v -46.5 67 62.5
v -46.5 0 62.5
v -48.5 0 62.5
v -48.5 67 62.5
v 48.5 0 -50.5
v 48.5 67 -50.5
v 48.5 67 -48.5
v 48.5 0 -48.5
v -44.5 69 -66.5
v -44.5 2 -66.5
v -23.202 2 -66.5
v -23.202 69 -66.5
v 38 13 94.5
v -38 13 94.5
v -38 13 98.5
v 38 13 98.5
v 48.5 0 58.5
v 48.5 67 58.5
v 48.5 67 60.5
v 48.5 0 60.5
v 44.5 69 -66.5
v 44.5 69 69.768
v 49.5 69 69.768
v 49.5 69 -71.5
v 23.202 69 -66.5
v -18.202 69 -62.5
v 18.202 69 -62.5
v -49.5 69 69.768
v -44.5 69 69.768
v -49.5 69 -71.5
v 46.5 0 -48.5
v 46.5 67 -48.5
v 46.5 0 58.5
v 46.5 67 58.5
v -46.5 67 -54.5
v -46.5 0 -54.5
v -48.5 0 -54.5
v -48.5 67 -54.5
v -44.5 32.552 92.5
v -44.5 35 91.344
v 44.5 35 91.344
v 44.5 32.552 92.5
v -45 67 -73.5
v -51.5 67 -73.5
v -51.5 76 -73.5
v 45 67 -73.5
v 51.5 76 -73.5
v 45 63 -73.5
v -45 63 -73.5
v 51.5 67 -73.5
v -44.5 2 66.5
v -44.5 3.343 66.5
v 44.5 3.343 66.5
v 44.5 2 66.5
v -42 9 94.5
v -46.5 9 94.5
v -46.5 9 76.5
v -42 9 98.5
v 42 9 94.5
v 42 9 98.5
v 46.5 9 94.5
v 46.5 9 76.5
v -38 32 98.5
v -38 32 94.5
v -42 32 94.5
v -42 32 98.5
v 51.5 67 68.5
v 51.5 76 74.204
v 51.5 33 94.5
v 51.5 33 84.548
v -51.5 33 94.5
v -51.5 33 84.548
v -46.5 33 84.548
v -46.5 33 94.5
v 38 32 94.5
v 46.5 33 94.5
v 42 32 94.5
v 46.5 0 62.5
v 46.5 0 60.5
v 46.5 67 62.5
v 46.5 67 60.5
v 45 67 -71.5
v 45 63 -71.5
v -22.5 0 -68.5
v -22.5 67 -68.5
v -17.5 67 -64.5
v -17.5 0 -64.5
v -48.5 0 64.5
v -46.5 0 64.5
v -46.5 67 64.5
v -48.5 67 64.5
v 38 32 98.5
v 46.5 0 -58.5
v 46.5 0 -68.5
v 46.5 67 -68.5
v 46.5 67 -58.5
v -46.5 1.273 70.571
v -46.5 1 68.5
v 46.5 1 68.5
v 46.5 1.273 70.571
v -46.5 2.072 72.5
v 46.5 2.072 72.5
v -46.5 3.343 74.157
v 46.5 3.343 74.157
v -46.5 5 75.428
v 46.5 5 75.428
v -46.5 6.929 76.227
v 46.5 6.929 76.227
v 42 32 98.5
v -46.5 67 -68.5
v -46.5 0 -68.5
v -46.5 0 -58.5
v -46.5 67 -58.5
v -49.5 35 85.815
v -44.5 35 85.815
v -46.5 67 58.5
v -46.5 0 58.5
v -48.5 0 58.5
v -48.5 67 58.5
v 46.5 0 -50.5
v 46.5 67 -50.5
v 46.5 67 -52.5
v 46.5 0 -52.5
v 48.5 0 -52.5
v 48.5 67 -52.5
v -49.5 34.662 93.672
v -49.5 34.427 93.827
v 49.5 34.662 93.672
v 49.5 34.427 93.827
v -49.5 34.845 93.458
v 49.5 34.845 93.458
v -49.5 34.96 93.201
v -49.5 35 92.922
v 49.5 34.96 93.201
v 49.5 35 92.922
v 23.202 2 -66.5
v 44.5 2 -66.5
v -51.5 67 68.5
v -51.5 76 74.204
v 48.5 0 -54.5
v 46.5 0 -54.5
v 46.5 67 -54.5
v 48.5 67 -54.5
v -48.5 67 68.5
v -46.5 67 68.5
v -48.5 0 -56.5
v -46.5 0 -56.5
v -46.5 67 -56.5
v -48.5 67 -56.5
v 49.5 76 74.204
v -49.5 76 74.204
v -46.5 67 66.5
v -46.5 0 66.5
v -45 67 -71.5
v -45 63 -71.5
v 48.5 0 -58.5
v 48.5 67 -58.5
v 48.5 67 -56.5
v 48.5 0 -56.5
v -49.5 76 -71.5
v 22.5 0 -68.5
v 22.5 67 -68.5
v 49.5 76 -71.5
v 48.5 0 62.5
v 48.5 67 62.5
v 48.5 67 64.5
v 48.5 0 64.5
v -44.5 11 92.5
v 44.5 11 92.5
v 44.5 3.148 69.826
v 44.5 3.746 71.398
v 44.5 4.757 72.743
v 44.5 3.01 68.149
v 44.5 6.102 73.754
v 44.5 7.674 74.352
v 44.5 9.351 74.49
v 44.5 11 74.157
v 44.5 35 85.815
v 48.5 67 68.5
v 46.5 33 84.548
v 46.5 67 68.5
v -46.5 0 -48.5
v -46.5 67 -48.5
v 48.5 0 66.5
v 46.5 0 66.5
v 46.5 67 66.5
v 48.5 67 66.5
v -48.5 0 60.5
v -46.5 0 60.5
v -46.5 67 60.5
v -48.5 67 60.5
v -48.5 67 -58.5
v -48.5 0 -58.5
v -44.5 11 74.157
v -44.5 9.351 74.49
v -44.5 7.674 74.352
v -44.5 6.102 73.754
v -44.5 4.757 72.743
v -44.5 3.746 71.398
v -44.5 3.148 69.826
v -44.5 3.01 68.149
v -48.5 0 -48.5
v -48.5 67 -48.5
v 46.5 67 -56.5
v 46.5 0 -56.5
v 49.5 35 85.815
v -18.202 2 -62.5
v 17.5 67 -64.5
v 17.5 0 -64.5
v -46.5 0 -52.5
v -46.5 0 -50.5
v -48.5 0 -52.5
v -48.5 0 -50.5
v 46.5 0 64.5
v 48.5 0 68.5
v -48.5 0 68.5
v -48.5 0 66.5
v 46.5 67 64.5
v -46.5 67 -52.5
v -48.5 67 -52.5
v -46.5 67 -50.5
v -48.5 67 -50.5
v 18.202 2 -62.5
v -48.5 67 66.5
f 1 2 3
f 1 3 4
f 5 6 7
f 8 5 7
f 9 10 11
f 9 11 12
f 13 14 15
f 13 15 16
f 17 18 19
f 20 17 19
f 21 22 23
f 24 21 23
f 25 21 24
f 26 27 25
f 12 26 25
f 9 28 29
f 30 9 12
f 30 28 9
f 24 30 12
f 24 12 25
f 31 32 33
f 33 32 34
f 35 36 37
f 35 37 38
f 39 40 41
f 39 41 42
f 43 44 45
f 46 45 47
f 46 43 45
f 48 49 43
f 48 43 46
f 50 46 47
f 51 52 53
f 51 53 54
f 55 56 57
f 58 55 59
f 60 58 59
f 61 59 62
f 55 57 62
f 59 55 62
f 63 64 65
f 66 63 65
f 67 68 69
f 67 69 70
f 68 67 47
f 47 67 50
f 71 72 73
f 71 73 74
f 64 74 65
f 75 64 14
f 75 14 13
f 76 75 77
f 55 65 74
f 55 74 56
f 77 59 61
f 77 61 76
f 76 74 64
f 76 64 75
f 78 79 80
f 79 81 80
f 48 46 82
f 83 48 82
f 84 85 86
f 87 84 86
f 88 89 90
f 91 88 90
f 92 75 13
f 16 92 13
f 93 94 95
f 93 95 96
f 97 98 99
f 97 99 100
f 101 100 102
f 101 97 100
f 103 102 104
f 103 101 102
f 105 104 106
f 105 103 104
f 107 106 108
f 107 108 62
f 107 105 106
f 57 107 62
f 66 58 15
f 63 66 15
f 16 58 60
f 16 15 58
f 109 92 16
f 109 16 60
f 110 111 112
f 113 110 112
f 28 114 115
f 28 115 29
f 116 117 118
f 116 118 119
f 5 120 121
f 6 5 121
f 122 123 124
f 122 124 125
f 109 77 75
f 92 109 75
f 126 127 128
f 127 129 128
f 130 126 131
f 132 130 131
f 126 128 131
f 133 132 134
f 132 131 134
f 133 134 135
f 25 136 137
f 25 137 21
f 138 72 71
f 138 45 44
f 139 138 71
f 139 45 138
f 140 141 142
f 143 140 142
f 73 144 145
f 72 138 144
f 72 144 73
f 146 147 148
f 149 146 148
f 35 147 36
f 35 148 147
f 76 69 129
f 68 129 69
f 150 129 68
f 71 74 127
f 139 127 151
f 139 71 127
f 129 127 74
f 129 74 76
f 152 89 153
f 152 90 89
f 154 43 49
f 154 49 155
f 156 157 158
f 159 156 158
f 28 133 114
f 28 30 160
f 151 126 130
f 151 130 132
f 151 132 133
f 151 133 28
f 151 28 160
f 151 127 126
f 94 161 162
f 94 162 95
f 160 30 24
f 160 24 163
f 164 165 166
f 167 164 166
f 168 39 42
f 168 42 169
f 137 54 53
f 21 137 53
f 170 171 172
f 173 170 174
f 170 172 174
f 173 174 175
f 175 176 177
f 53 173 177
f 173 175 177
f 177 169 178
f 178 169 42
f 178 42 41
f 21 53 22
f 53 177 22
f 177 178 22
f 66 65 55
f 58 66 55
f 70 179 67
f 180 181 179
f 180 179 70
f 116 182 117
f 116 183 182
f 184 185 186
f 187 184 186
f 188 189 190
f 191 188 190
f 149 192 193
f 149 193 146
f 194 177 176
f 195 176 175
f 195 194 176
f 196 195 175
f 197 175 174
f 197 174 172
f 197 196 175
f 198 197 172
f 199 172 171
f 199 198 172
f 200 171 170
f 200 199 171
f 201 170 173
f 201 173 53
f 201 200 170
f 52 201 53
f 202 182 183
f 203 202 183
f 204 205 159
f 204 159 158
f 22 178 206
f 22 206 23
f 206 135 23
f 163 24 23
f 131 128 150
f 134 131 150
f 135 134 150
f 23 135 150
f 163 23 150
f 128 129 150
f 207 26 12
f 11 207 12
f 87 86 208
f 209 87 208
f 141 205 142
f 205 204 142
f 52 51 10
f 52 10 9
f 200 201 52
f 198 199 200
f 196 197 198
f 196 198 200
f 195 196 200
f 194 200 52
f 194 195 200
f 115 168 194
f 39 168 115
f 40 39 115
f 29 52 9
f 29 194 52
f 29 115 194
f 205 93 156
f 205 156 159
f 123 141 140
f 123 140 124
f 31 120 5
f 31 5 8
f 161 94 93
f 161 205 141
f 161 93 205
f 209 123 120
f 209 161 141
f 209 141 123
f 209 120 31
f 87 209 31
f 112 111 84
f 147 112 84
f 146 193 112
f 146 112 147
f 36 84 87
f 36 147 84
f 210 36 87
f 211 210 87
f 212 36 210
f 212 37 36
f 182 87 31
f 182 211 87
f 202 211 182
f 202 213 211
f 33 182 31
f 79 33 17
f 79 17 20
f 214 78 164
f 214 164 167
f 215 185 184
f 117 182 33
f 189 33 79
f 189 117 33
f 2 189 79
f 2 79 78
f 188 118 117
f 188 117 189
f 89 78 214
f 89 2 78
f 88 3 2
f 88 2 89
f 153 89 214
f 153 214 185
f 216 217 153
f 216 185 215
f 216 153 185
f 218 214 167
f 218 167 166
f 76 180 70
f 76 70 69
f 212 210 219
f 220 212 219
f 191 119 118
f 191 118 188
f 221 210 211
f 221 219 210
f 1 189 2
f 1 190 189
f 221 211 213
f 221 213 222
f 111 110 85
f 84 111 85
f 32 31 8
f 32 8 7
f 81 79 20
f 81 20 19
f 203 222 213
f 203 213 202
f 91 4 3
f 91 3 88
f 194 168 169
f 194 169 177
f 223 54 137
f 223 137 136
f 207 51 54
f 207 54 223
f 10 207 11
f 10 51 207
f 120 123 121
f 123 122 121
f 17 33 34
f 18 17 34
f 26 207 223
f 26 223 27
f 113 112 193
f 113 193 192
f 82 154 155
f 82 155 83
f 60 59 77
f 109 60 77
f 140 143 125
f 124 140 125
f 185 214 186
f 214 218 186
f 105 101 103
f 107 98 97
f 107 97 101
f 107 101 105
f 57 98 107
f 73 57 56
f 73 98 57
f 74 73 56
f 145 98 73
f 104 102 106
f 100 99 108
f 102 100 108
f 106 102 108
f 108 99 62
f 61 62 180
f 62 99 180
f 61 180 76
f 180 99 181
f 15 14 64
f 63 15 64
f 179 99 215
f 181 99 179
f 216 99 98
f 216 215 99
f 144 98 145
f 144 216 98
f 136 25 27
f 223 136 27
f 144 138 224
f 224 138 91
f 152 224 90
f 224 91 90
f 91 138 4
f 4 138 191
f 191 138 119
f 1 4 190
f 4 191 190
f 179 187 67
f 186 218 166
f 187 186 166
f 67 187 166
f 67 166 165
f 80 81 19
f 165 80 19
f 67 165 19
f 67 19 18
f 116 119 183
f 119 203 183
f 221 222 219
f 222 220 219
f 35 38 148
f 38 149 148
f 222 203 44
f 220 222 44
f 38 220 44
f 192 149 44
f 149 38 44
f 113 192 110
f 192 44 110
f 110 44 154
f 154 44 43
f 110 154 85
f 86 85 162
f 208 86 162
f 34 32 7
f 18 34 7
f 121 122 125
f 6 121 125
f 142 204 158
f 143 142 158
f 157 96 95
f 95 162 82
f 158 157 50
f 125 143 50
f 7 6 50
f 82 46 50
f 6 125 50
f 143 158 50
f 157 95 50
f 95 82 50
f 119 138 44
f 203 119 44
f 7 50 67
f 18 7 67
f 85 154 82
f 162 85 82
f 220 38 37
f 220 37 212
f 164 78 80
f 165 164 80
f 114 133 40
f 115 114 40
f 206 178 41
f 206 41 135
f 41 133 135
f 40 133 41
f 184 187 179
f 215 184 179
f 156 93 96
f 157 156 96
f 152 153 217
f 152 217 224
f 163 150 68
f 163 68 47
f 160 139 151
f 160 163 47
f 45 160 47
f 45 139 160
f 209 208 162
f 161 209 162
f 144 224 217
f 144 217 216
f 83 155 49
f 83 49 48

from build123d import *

# Parameters (mm, degrees)
BOSS_EXTRUDE1_DEPTH = 67
SKETCH2_W           = 103
SKETCH2_H           = 142
BOSS_EXTRUDE2_DEPTH = 9
SKETCH3_W           = 90
SKETCH3_H           = 2
BOSS_EXTRUDE3_DEPTH = 4
SKETCH4_W           = 93
SKETCH4_H           = 24
BOSS_EXTRUDE4_DEPTH = 26
BOSS_EXTRUDE5_DEPTH = 93
BOSS_EXTRUDE6_REACH = 161.108
BOSS_EXTRUDE7_DEPTH = 93
SHELL5_START        = -44.5
SHELL5_DEPTH        = 89
SHELL5_START_2      = -49.5
SHELL5_2_DEPTH      = 99
SHELL5_3_OUTLINE_W  = 67
SHELL5_3_OUTLINE_H  = 4
SHELL5_3_DEPTH      = 21.298437881
SHELL5_START_3      = 23.201562119
SHELL5_4_OUTLINE_W  = 67
SHELL5_4_OUTLINE_H  = 4
SHELL5_4_DEPTH      = 21.298437881
SHELL5_START_4      = 2
SHELL5_5_DEPTH      = 67
CUT_EXTRUDE1_REACH  = 193.448
SKETCH11_W          = 99
SKETCH11_H          = 41
FILLET2_R           = 1
SKETCH12_W          = 2
SKETCH12_H          = 67
BOSS_EXTRUDE8_DEPTH = 2
SKETCH13_W          = 76
SKETCH13_H          = 4
BOSS_EXTRUDE9_DEPTH = 4


with BuildPart() as part:
    # Sketch1 → Boss-Extrude1 (new body)
    with BuildSketch(Plane(origin=(0, 0, 0), x_dir=(1, 0, 0), z_dir=(0, 1, 0))):
        Polygon((-17.5, 64.5), (17.5, 64.5), (22.5, 68.5), (46.5, 68.5), (46.5, -68.5), (-46.5, -68.5), (-46.5, 68.5), (-22.5, 68.5), align=None)
    extrude(amount=BOSS_EXTRUDE1_DEPTH)

    # Sketch2 → Boss-Extrude2 (add)
    with BuildSketch(Plane(origin=(0, 67, 0), x_dir=(1, 0, 0), z_dir=(0, 1, 0))):
        with Locations((0, 2.5)):
            Rectangle(SKETCH2_W, SKETCH2_H)
    extrude(amount=BOSS_EXTRUDE2_DEPTH)

    # Sketch3 → Boss-Extrude3 (add)
    with BuildSketch(Plane.XZ.offset(-67)):
        with Locations((0, -72.5)):
            Rectangle(SKETCH3_W, SKETCH3_H)
    extrude(amount=BOSS_EXTRUDE3_DEPTH)

    # Sketch4 → Boss-Extrude4 (add)
    with BuildSketch(Plane.XY.offset(68.5)):
        with Locations((0, 21)):
            Rectangle(SKETCH4_W, SKETCH4_H)
    extrude(amount=BOSS_EXTRUDE4_DEPTH)

    # Sketch5 → Boss-Extrude5 (add)
    with BuildSketch(Plane.ZY.offset(46.5)):
        Polygon((68.5, 67), (94.5, 33), (68.5, 33), align=None)
    extrude(amount=-BOSS_EXTRUDE5_DEPTH)

    # Boss-Extrude6: up to this face of the body (flat: up to its plane)
    boss_extrude6_end = Plane(part.part.faces().sort_by_distance((51.5, 71.5, -2.5))[0])
    # Sketch7 → Boss-Extrude6 (add, up to the picked face)
    with BuildSketch(Plane.ZY.offset(51.5), mode=Mode.PRIVATE) as boss_extrude6_sk1:
        Polygon((68.5, 67), (84.547855551, 33), (94.5, 33), (74.204182686, 76), (68.5, 76), align=None)
    boss_extrude6_tool1 = split(extrude(boss_extrude6_sk1.sketch, amount=-BOSS_EXTRUDE6_REACH, mode=Mode.PRIVATE), bisect_by=boss_extrude6_end, keep=Keep.BOTH, mode=Mode.PRIVATE)
    add(boss_extrude6_tool1.solids().sort_by(Axis((-51.5, 53.63498, 79.950766), (1, 0, 0)))[0])

    # Sketch8 → Boss-Extrude7 (add)
    with BuildSketch(Plane.ZY.offset(46.5)):
        with BuildLine():
            Line((76.5, 9), (68.5, 9))
            Line((68.5, 9), (68.5, 1))
            ThreePointArc((68.5, 1), (74.156854249, 3.343145751), (76.5, 9))
        make_face()
    extrude(amount=-BOSS_EXTRUDE7_DEPTH)

    # Shell5: read off the stored shape, not the designer's step
    # Shell5 outline → Shell5 (cut)
    with BuildSketch(Plane.YZ.offset(SHELL5_START)):
        with BuildLine():
            Line((69, -71.5), (76, -71.5))
            Line((76, -71.5), (76, 71.992595031))
            Line((76, 71.992595031), (32.551717034, 92.5))
            Line((32.551717034, 92.5), (11, 92.5))
            Line((11, 92.5), (11, 74.156854249))
            ThreePointArc((11, 74.156854249), (4.757359313, 72.742640687), (3.343145751, 66.5))
            Line((3.343145751, 66.5), (2, 66.5))
            Line((2, 66.5), (2, -62.5))
            Line((2, -62.5), (69, -62.5))
            Line((69, -62.5), (69, -71.5))
        make_face()
    extrude(amount=SHELL5_DEPTH, mode=Mode.SUBTRACT)

    # Shell5 2 outline → Shell5 2 (cut)
    with BuildSketch(Plane.YZ.offset(SHELL5_START_2)):
        Polygon((69, -71.5), (76, -71.5), (76, 71.992595031), (35, 91.344420842), (35, 85.815451703), (69, 69.767596152), align=None)
    extrude(amount=SHELL5_2_DEPTH, mode=Mode.SUBTRACT)

    # Shell5 3 outline → Shell5 3 (cut)
    with BuildSketch(Plane.YZ.offset(SHELL5_START)):
        with Locations((35.5, -64.5)):
            Rectangle(SHELL5_3_OUTLINE_W, SHELL5_3_OUTLINE_H)
    extrude(amount=SHELL5_3_DEPTH, mode=Mode.SUBTRACT)

    # Shell5 4 outline → Shell5 4 (cut)
    with BuildSketch(Plane.YZ.offset(SHELL5_START_3)):
        with Locations((35.5, -64.5)):
            Rectangle(SHELL5_4_OUTLINE_W, SHELL5_4_OUTLINE_H)
    extrude(amount=SHELL5_4_DEPTH, mode=Mode.SUBTRACT)

    # Shell5 5 outline → Shell5 5 (cut)
    with BuildSketch(Plane(origin=(0, 0, 0), x_dir=(1, 0, 0), z_dir=(0, 1, 0)).offset(SHELL5_START_4)):
        Polygon((-23.201562119, 62.5), (-18.201562119, 62.5), (-23.201562119, 66.5), align=None)
        Polygon((23.201562119, 66.5), (18.201562119, 62.5), (23.201562119, 62.5), align=None)
    extrude(amount=SHELL5_5_DEPTH, mode=Mode.SUBTRACT)

    # Cut-Extrude1: up to this face of the body (flat: up to its plane)
    cut_extrude1_end = Plane(part.part.faces().sort_by_distance((-47, 52, 77.791523927))[0])
    # Sketch11 → Cut-Extrude1 (cut, up to the picked face)
    with BuildSketch(Plane.XY.offset(94.5), mode=Mode.PRIVATE) as cut_extrude1_sk1:
        with Locations((0, 55.5)):
            Rectangle(SKETCH11_W, SKETCH11_H)
    cut_extrude1_tool1 = split(extrude(cut_extrude1_sk1.sketch, amount=-CUT_EXTRUDE1_REACH, mode=Mode.PRIVATE), bisect_by=cut_extrude1_end, keep=Keep.BOTH, mode=Mode.PRIVATE)
    add(cut_extrude1_tool1.solids().sort_by(Axis((0, 55.5, 94.5), (0, 0, -1)))[0], mode=Mode.SUBTRACT)

    # Fillet2
    fillet2_edges = [part.edges().sort_by_distance(p)[0] for p in [
        (0, 35, 93.556008497),
    ]]
    fillet(fillet2_edges, radius=FILLET2_R)

    # Sketch12 → Boss-Extrude8 (add)
    with BuildSketch(Plane.ZY.offset(46.5)):
        with Locations((-57.5, 33.5)):
            Rectangle(SKETCH12_W, SKETCH12_H)
        with Locations((-53.5, 33.5)):
            Rectangle(SKETCH12_W, SKETCH12_H)
        with Locations((-49.5, 33.5)):
            Rectangle(SKETCH12_W, SKETCH12_H)
        with Locations((59.5, 33.5)):
            Rectangle(SKETCH12_W, SKETCH12_H)
        with Locations((63.5, 33.5)):
            Rectangle(SKETCH12_W, SKETCH12_H)
        with Locations((67.5, 33.5)):
            Rectangle(SKETCH12_W, SKETCH12_H)
    boss_extrude8 = extrude(amount=BOSS_EXTRUDE8_DEPTH)

    # Mirror1: Boss-Extrude8 across plane
    add(boss_extrude8.mirror(Plane(origin=(0, 0, 0), x_dir=(0, 0, 1), z_dir=(1, 0, 0))))

    # Sketch13 → Boss-Extrude9 (add)
    with BuildSketch(Plane.XY.offset(94.5)):
        Polygon((-42, 32), (-42, 9), (-38, 9), (-38, 13), (-38, 32), align=None)
        with Locations((0, 11)):
            Rectangle(SKETCH13_W, SKETCH13_H)
        Polygon((38, 13), (38, 9), (42, 9), (42, 32), (38, 32), align=None)
    extrude(amount=BOSS_EXTRUDE9_DEPTH)


solid = part.part
